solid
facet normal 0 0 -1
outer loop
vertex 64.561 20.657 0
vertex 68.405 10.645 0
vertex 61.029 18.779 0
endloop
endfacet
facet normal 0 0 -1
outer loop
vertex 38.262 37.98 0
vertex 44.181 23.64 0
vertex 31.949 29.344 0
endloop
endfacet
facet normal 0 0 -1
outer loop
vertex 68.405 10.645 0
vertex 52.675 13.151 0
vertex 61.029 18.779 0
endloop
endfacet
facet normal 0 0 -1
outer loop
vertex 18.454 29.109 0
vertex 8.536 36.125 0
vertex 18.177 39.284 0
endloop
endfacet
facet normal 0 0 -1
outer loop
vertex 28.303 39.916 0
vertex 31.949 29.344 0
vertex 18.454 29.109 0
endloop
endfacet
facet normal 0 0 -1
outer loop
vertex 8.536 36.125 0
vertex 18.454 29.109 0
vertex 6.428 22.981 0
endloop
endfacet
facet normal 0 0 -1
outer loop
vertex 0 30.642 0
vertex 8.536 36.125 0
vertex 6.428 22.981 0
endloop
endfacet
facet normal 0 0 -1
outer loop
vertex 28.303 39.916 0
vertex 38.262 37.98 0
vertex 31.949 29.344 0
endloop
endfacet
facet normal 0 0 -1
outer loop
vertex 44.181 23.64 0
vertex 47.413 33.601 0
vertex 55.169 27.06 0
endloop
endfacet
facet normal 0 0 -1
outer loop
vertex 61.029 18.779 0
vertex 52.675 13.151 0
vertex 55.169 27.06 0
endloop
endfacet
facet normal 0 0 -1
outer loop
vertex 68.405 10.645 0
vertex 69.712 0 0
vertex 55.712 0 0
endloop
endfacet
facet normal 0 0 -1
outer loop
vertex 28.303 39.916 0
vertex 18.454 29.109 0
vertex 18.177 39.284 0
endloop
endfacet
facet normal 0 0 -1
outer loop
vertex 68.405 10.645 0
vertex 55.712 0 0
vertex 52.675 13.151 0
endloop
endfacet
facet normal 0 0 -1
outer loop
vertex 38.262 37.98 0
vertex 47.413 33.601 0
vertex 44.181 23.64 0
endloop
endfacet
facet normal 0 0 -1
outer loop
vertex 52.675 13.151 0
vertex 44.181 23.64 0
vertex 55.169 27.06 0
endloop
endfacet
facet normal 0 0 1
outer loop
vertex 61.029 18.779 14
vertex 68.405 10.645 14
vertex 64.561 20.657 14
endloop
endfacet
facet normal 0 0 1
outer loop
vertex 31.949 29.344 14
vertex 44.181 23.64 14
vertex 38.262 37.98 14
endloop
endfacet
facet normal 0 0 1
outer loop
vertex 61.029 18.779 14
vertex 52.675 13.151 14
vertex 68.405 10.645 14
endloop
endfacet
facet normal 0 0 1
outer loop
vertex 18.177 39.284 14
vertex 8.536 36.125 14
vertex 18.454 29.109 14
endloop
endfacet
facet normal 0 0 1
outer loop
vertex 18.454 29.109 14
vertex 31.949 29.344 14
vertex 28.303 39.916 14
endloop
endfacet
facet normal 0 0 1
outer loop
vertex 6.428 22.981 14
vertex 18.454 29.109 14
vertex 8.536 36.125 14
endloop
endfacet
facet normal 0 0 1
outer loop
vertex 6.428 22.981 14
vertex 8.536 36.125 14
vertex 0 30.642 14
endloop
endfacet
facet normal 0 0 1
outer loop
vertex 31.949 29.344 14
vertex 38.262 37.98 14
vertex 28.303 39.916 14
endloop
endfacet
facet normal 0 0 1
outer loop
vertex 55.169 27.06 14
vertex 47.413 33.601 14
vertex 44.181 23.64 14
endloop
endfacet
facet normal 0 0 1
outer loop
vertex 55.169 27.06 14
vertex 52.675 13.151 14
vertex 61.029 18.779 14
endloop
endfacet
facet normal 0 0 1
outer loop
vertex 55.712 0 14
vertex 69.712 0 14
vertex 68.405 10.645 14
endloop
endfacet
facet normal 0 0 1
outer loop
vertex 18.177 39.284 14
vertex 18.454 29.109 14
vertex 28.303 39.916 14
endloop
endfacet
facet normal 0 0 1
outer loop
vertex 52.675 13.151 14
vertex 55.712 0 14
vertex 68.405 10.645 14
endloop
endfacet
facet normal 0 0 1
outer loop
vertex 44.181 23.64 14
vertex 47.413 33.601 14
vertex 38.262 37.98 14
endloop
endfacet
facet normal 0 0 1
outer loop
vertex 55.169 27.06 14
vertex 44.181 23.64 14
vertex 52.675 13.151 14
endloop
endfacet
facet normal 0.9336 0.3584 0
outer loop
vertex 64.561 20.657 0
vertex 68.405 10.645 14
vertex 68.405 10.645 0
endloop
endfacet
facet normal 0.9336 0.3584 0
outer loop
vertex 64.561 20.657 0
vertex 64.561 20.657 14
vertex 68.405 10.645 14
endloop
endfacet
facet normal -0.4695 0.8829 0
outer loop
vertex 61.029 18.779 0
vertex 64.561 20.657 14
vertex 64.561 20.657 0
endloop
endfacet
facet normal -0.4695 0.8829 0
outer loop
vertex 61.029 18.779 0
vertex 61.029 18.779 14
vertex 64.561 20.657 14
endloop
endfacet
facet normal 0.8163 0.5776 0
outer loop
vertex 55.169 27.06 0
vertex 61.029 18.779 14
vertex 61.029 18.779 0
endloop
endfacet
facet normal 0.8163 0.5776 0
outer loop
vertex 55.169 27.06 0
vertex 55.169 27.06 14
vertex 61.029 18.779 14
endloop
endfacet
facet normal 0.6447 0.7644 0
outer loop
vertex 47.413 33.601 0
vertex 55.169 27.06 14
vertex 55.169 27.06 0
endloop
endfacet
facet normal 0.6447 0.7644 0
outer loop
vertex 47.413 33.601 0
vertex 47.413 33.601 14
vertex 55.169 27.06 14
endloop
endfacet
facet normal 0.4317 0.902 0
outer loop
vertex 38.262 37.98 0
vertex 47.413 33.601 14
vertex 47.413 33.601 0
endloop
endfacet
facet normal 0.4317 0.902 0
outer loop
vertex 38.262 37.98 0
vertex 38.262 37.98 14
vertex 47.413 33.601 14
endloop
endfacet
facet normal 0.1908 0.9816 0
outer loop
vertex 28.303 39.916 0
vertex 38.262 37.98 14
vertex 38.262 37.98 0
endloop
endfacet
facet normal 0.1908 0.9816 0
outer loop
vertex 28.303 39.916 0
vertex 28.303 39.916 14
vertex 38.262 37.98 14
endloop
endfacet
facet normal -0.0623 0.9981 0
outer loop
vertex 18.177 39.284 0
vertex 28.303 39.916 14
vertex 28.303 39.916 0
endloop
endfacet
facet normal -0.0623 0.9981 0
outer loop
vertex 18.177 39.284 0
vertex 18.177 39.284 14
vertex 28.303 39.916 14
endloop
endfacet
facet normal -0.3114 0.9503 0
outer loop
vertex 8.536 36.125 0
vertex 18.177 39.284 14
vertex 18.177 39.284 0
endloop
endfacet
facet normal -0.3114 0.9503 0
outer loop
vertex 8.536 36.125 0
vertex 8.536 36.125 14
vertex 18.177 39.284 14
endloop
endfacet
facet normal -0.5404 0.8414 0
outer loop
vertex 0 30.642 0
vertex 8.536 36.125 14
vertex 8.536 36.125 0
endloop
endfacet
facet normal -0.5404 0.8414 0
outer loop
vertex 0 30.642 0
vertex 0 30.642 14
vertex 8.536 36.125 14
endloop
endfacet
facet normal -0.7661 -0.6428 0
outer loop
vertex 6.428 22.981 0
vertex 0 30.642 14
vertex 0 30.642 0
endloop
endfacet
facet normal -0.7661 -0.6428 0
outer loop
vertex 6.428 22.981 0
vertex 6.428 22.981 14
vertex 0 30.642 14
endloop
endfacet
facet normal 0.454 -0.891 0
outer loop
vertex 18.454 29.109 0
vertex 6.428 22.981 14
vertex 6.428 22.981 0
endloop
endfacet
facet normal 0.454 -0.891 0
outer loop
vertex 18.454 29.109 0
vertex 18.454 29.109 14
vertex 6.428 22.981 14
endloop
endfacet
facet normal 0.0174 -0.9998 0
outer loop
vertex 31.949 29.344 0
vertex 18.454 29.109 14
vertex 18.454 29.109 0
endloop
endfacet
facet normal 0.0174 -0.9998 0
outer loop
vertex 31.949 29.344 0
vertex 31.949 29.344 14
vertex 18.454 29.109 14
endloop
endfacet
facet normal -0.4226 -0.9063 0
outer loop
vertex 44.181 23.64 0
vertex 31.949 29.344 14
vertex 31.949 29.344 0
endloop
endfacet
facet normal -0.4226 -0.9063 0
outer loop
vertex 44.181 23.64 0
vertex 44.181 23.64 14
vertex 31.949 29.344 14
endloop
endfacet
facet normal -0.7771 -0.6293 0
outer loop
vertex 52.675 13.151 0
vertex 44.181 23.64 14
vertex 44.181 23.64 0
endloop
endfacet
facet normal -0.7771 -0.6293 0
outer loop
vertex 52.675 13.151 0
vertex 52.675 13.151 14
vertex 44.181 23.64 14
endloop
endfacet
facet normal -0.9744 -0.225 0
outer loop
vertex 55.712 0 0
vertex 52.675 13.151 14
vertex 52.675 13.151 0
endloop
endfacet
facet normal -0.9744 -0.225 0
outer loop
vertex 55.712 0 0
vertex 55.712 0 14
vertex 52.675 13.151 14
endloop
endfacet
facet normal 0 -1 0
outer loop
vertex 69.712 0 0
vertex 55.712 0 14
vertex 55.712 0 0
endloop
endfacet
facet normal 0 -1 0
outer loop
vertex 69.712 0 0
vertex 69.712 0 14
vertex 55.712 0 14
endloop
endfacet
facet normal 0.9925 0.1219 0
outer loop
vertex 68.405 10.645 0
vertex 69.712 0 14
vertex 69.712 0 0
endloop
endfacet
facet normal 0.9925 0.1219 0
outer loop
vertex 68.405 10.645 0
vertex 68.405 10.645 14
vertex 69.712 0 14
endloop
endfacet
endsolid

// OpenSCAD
$fn = 32;

// ----------------------------------------------------------------------
// Arc stop: segment, 14 mm thick
// ----------------------------------------------------------------------

// --- parameters (mm) ---
profile_height = 14;      // extrusion height
profile_points = 17;      // points of the closed outline

profile = [[69.712, 0], [68.405, 10.645], [64.561, 20.657], [61.029, 18.779], [55.169, 27.06], [47.413, 33.601], [38.262, 37.98], [28.303, 39.916], [18.177, 39.284], [8.536, 36.125], [0, 30.642], [6.428, 22.981], [18.454, 29.109], [31.949, 29.344], [44.181, 23.64], [52.675, 13.151], [55.712, 0]];  // single closed polygon, 17 points, counter clockwise

// --- the one profile operation ---
linear_extrude(height = profile_height) polygon(points = profile);
